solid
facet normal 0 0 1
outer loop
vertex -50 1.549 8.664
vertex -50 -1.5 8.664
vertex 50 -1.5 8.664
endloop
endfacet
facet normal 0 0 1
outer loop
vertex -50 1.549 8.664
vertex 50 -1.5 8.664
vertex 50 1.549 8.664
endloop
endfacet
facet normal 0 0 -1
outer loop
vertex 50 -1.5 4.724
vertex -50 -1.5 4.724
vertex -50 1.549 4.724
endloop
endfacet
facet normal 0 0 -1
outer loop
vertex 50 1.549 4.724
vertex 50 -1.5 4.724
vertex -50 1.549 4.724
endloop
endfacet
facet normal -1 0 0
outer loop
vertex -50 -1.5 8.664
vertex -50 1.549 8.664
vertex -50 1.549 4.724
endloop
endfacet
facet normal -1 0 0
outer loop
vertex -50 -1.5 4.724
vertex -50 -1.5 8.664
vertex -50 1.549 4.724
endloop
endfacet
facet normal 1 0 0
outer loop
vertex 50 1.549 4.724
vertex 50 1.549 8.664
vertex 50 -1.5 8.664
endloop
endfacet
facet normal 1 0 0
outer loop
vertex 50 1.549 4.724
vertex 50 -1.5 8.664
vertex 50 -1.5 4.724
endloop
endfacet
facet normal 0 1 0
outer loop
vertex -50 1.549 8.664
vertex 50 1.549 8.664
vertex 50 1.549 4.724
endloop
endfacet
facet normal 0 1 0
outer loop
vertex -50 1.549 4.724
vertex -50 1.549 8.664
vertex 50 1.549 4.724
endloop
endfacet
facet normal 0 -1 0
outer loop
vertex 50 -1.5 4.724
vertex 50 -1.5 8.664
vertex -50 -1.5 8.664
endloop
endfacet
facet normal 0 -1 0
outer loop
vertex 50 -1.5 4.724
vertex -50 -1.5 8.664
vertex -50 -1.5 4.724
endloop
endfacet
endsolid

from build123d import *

# Parameters (mm, degrees)
BOSS_EXTRUDE2_START     = -50
BOSS_EXTRUDE2_OUTLINE_W = 3.939378075
BOSS_EXTRUDE2_OUTLINE_H = 3.049171024
BOSS_EXTRUDE2_DEPTH     = 100


# Read off the part's stored shape, not the designer's step: Boss-Extrude2
with BuildPart() as part:
    # Boss-Extrude2 outline → Boss-Extrude2 (new body)
    with BuildSketch(Plane(origin=(0, 0, 0), x_dir=(0, 0, -1), z_dir=(1, 0, 0)).offset(BOSS_EXTRUDE2_START)):
        with Locations((-6.693964747, 0.024585512)):
            Rectangle(BOSS_EXTRUDE2_OUTLINE_W, BOSS_EXTRUDE2_OUTLINE_H)
    extrude(amount=BOSS_EXTRUDE2_DEPTH)


solid = part.part
